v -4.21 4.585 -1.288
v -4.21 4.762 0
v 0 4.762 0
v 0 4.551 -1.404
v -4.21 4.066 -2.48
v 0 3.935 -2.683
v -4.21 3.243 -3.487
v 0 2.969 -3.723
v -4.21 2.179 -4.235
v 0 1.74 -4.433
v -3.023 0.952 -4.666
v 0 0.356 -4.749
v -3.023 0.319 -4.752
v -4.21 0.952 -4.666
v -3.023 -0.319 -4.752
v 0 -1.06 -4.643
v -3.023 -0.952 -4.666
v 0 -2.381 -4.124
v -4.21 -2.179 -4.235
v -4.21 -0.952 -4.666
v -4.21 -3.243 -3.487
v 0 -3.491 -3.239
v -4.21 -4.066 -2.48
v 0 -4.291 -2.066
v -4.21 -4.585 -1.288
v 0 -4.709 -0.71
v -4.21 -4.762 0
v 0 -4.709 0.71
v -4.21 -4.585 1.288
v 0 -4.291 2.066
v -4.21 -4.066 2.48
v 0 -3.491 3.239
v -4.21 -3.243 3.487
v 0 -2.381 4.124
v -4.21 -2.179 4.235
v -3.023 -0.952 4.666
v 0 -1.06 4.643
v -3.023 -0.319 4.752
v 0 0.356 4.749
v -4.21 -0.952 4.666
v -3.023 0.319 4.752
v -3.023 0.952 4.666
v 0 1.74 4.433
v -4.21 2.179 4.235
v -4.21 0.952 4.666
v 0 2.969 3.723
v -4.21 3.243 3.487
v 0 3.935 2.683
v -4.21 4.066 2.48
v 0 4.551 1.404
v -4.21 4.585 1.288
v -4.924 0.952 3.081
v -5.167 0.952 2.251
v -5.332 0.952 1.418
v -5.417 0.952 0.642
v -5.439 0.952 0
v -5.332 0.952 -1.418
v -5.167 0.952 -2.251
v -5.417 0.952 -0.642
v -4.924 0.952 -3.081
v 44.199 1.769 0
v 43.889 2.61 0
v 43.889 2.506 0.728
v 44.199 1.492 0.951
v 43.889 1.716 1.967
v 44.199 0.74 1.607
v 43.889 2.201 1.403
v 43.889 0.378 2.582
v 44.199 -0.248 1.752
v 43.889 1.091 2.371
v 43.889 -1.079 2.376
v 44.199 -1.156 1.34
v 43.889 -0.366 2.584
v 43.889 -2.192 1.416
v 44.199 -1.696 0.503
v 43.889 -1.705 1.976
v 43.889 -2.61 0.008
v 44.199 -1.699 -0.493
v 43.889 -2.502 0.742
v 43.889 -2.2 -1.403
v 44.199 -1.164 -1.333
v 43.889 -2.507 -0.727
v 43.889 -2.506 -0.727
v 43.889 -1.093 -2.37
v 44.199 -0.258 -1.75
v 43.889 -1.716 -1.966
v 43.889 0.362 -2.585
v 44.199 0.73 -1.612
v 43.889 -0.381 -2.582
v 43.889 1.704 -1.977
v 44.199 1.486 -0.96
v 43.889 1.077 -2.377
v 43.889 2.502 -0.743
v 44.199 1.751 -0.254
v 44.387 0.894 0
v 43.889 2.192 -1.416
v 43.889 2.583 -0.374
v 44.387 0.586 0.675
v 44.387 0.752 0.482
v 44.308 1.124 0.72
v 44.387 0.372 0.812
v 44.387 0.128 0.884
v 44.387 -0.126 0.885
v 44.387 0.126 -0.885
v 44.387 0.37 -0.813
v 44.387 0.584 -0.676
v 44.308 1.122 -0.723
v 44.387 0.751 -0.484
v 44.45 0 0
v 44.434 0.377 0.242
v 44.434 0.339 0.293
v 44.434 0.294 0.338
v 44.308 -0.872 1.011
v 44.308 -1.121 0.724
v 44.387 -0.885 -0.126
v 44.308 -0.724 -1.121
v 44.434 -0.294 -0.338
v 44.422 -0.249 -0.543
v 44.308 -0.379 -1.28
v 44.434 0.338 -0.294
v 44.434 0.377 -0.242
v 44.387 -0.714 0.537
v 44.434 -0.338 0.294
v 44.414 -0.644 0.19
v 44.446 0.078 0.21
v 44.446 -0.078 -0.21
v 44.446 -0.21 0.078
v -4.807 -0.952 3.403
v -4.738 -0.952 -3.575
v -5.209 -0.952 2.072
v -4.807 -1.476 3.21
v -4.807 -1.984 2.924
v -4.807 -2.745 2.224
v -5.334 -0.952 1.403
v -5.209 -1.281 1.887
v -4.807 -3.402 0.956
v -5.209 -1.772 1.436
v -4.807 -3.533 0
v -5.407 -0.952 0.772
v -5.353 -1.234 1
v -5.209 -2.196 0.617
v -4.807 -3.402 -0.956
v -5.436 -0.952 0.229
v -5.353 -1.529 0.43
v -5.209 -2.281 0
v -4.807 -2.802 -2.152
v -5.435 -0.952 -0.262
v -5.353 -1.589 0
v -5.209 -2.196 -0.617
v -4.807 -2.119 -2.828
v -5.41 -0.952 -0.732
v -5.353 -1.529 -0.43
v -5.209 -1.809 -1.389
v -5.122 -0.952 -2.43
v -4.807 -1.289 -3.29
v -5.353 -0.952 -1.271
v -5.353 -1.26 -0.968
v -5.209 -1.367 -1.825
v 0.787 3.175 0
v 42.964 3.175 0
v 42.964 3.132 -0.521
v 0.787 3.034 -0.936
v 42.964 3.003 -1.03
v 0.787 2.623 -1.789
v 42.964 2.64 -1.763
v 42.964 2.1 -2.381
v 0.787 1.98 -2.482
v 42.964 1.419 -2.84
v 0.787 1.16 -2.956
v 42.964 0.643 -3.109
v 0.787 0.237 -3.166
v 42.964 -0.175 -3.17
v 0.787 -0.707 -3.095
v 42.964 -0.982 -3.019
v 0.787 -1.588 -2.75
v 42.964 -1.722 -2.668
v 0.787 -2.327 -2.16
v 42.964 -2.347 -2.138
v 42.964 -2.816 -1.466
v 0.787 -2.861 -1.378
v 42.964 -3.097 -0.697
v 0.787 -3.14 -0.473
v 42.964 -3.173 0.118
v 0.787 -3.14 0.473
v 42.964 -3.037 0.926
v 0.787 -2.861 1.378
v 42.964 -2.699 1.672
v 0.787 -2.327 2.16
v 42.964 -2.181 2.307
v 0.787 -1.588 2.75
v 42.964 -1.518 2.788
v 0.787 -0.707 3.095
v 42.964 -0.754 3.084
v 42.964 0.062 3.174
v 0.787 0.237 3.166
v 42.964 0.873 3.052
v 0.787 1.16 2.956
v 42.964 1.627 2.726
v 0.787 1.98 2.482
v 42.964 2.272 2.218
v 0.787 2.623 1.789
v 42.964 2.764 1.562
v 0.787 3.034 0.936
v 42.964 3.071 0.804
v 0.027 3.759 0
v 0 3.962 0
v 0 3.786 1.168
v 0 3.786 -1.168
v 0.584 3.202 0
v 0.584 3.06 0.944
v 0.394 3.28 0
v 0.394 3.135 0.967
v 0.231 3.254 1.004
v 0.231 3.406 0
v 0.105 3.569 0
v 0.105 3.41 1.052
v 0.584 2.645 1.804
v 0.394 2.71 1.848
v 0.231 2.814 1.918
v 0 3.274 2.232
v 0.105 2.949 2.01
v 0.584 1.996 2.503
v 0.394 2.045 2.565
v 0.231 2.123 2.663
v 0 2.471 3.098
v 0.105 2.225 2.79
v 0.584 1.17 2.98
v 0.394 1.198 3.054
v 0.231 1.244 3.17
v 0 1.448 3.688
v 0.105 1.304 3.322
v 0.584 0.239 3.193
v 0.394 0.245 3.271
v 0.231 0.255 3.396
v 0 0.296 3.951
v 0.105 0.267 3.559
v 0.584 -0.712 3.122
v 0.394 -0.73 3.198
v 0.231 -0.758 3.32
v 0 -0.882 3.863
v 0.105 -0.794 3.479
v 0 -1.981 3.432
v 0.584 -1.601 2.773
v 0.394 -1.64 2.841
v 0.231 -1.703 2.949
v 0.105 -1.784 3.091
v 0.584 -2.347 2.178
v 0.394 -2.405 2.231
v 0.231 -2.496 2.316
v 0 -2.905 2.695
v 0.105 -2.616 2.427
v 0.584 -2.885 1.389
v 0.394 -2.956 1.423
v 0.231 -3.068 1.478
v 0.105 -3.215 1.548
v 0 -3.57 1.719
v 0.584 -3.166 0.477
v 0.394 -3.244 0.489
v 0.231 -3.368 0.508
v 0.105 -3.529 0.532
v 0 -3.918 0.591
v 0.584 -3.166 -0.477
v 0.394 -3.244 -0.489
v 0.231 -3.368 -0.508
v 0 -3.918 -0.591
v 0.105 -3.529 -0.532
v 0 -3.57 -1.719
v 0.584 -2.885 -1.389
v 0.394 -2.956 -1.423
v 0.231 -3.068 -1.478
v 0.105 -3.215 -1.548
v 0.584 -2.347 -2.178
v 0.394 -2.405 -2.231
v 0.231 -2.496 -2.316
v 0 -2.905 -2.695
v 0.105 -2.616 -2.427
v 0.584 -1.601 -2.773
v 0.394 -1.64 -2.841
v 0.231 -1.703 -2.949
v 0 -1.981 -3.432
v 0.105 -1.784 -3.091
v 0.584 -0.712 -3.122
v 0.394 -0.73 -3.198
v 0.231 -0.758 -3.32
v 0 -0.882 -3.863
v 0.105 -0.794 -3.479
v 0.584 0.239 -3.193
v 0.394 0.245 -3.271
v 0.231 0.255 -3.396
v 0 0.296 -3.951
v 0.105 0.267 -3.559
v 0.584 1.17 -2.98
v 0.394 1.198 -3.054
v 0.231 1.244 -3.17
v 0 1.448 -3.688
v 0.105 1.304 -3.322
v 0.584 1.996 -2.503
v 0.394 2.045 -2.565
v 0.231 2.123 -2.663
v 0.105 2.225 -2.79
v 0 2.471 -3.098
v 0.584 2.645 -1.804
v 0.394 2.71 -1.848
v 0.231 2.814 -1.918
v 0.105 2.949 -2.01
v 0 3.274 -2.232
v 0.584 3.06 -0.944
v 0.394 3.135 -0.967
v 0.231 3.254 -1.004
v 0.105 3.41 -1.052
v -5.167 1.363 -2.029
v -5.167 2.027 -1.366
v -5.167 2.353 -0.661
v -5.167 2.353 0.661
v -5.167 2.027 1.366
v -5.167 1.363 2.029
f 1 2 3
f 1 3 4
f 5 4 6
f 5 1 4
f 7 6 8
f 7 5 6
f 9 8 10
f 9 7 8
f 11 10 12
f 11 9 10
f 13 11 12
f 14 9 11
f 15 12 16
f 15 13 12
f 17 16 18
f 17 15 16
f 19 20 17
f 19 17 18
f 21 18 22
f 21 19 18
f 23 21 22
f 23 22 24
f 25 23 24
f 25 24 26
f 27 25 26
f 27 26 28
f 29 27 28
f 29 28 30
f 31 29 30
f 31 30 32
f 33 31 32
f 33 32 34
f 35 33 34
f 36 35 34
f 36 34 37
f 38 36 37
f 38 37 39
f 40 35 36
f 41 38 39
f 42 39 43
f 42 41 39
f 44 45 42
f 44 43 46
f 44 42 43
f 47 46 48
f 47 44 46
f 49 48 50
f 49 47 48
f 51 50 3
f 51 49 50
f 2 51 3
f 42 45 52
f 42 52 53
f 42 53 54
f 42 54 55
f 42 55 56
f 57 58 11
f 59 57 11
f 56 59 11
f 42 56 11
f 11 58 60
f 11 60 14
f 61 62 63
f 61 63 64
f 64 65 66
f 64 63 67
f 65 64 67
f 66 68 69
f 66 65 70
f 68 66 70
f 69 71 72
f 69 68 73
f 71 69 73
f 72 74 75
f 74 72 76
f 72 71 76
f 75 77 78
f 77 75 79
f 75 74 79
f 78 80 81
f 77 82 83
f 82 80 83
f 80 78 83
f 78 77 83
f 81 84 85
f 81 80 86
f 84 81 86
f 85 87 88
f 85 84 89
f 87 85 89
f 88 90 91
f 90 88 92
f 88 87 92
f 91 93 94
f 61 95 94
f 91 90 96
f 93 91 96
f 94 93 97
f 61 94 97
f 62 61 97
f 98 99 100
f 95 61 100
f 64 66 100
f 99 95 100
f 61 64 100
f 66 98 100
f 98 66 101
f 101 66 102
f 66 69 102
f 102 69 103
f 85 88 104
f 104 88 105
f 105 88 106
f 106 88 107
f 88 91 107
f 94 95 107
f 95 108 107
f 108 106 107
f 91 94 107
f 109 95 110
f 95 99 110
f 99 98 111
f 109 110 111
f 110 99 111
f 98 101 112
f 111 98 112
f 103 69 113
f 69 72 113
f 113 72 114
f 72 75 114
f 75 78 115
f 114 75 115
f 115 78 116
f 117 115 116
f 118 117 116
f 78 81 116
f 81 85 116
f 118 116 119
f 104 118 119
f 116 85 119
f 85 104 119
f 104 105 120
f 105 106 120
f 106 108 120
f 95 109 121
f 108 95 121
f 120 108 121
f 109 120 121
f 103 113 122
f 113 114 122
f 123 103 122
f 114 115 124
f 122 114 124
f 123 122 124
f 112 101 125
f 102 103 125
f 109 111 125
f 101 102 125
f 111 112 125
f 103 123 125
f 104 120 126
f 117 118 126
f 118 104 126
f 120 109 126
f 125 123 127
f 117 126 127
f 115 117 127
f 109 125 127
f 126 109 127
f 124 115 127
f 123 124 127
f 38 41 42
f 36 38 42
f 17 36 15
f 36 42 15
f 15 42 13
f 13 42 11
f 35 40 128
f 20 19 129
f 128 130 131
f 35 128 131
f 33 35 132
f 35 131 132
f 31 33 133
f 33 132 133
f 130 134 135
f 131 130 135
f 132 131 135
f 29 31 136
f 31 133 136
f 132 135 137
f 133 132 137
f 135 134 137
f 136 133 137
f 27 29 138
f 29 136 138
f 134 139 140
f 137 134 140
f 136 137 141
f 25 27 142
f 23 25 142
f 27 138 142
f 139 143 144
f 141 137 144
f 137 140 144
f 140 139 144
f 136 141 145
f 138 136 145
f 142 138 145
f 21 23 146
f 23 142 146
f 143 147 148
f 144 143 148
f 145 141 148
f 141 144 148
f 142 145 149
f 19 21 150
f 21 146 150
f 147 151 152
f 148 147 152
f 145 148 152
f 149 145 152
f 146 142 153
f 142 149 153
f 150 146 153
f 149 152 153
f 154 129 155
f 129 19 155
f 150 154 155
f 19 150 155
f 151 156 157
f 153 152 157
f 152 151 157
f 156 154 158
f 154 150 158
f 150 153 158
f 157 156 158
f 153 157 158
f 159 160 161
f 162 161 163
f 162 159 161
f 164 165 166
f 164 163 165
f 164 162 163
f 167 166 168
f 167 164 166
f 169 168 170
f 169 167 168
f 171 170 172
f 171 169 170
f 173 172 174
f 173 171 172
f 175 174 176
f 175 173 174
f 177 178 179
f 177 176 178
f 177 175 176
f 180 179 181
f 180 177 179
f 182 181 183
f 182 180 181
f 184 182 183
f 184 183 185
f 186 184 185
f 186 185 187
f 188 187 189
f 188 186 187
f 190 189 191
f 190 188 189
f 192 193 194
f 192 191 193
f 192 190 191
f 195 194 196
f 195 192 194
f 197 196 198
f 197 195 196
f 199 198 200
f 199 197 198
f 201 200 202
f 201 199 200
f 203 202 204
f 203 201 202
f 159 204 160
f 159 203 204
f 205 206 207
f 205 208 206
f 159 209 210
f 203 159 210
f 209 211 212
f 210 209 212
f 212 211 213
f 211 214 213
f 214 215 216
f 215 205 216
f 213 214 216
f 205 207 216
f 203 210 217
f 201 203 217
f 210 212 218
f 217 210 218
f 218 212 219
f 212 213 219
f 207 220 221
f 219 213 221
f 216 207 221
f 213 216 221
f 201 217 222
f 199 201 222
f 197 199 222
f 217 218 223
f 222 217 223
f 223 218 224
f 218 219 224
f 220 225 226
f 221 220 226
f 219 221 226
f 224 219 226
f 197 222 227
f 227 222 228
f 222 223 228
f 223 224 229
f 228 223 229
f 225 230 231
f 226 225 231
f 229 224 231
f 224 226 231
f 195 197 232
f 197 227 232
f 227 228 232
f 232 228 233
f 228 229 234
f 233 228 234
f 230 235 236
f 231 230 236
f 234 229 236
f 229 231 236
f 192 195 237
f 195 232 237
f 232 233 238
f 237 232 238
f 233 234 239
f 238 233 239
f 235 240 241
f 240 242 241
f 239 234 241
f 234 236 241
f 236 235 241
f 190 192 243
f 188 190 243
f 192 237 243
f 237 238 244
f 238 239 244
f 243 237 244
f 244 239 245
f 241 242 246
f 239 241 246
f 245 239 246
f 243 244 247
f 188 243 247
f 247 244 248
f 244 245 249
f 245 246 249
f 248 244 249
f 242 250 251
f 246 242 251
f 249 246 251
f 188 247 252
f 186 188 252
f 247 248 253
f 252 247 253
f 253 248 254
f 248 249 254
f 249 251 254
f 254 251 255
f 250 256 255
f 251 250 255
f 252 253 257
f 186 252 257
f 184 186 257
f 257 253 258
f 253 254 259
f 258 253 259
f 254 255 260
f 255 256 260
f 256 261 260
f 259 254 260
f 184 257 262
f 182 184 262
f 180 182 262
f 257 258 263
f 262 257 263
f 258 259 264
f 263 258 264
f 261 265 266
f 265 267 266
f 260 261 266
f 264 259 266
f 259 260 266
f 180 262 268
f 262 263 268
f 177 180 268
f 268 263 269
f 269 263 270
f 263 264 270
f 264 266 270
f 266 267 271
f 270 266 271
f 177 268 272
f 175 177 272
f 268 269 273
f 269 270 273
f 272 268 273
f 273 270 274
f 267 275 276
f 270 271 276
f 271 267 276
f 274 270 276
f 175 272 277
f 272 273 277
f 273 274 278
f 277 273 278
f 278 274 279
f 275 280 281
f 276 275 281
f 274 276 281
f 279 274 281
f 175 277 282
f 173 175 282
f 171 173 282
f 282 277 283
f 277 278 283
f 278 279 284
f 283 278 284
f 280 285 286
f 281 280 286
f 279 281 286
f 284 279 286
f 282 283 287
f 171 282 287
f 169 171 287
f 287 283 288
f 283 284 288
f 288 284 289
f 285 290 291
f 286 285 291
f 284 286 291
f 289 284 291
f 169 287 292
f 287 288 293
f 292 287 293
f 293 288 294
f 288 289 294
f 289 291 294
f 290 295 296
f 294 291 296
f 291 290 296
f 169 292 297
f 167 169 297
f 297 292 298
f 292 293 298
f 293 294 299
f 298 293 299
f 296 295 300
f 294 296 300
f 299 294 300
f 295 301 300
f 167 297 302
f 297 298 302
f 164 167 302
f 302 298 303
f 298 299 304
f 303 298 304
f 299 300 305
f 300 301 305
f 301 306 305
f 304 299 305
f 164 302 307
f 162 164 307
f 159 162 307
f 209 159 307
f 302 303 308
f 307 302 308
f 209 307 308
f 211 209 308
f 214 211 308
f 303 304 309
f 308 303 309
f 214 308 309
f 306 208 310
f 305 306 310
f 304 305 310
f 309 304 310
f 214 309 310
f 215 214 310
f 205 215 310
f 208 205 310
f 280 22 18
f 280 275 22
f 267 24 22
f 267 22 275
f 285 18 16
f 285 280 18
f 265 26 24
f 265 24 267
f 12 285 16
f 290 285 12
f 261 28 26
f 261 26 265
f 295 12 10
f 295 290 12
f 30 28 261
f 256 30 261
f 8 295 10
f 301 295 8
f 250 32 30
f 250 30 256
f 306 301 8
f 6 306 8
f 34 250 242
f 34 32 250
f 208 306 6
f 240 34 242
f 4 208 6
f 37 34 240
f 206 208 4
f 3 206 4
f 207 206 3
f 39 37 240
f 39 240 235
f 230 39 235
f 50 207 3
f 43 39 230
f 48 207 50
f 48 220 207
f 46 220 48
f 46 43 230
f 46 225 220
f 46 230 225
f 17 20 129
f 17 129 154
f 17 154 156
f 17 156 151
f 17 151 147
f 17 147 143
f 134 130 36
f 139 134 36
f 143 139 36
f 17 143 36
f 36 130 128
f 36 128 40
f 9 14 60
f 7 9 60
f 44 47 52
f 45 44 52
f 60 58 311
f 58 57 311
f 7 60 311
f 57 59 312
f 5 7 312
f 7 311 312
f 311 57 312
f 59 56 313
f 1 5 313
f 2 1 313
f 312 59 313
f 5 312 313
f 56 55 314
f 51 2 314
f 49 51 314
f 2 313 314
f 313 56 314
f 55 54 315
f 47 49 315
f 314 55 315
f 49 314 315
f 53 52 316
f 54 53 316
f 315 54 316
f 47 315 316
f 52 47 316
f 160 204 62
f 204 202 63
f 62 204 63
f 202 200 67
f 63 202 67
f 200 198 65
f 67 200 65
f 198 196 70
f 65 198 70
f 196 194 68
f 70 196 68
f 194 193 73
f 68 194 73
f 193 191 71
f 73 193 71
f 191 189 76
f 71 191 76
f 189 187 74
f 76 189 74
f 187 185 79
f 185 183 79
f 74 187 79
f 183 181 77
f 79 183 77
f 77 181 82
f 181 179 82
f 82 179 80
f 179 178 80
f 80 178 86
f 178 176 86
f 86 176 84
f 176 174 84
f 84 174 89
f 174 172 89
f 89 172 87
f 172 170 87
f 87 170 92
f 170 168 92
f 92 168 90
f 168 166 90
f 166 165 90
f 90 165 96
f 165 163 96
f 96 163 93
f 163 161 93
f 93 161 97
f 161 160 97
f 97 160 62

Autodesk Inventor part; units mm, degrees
ref_plane "YZ Plane" through (0, 0, 0) normal (1, 0, 0) x (0, 1, 0)
sketch "Sketch1" plane through (0, 0, 0) normal (0, 0, 1) x (1, 0, 0)
  line L0 (-5.4864, 0) -> (44.45, 0)
  line L1 (44.45, 0) -> (44.45, 3.175)
  line L2 (44.45, 3.175) -> (25.4, 3.175)
  line L3 (25.4, 3.175) -> (24.638, 3.175)
  line L4 (24.638, 3.175) -> (0, 3.175)
  line L5 (0, 3.175) -> (0, 4.7625)
  line L6 (-15.8499, 0) -> (54.5, 0) projected
  line L7 (0, -0.9693) -> (0, 5.8158) projected
  line L8 (0, 4.7625) -> (-4.2103, 4.7625)
  arc A0 (-4.2103, 4.7625) -> (-5.4864, 0) centre (4.0386, 0) ccw
  line L9 (25.4, 3.175) -> (0, 3.175) construction
  dimension "d0" = 44.45
  dimension "d1" = 19.05
  dimension "d2" = 0.762
  dimension "d3" = 5.4864
  dimension "d4" = 6.35
  dimension "d5" = 6.35
  dimension "d9" = 9.525
  dimension "d10" = 0
  dimension "d13" = 9.525
revolve "Body" add sketch "Sketch1" angle 360 about axis through (-5.4864, 0, 0) along (1, 0, 0)
ref_plane "IDS_WORKPLANE{1}" through (-5.4864, 0, 0) normal (1, 0, 0) x (0, 0, -1)
sketch "Sketch2" plane through (-5.4864, 0, 0) normal (1, 0, 0) x (0, 0, -1)
  circle A0 centre (0, 0) radius 4.7625 projected
  line L0 (0, -6.6675) -> (0, 6.6675) projected
  line L1 (6.6675, 0) -> (-6.6675, 0) projected
  line L2 (-4.7625, 0.9525) -> (4.7625, 0.9525)
  line L3 (4.7625, 0.9525) -> (4.7625, -0.9525)
  line L4 (4.7625, -0.9525) -> (-4.7625, -0.9525)
  line L5 (-4.7625, -0.9525) -> (-4.7625, 0.9525)
  line L6 (-4.7625, 0) -> (4.7625, 0) construction
  line L7 (0, 0.9525) -> (0, -0.9525) construction
  dimension "d15" = 1.905
extrude "Slot" cut sketch "Sketch2" along normal blind 2.4638 contours L1 L0 L2 A0 | L3 L4 A0 | A0 L4 L0 L1 | A0 L2 L3 | L1 A0 L2 L0 | L0 L4 A0 L1 | L5 L2 A0 | A0 L4 L5
thread "Thread" size "1/4-20 UNC" class "2A" standard "ANSI Unified Screw Threads" length 19.05
sketch "Sketch3" plane through (0, 0, 0) normal (0, 0, 1) x (1, 0, 0)
  line L0 (44.45, 0) -> (44.45, 3.175) projected
  line L1 (44.45, 3.175) -> (25.4, 3.175) projected
  line L2 (-5.4864, 0) -> (44.45, 0) projected
  arc A0 (44.45, 0) -> (43.5993, 3.175) centre (38.1, 0) ccw
  line L3 (44.45, -3.175) -> (44.45, 3.175) projected
  line L4 (43.5993, 3.175) -> (43.5993, 0)
  line L5 (43.5993, 0) -> (44.45, 0)
  dimension "d40" = 6.35
revolve "Fillet1" cut sketch "Sketch3" angle 360 about axis through (-5.4864, 0, 0) along (1, 0, 0) contours A0 L1 L0
chamfer "Chamfer" distance 0.635 angle 45 1 edges at (43.5993, -3.175, 0)
ref_plane "Work Plane2" through (41.275, 0, 0) normal (0, 0, -1) x (1, 0, 0)
fillet "Fillet4" radius 0.7874 1 edges at (0, -3.175, 0)
equation "\"d0\" = NLG"
equation "\"d1\" = GEL"
equation "\"d2\" = GAL"
equation "\"d3\" = KOH"
equation "\"d4\" = GD"
equation "\"d5\" = BDM"
equation "\"d9\" = KOD"
equation "\"d13\" = KR"
equation "\"d15\" = SBR"
equation "\"d16\" = STI"
equation "\"d40\" = GD"
equation "\"d46\" = R"
equation "\"d11\" = GEL"
equation "\"d43\" = 0.5 * RR"
equation "\"GD\" = NND"
equation "\"NLG\" = 44.45"
equation "\"GEL\" = 19.05"
equation "\"KOD\" = 9.525"
equation "\"KOH\" = 5.4864"
equation "\"GAL\" = 0.762"
equation "\"BDM\" = NND"
equation "\"SBR\" = 1.905"
equation "\"STI\" = 2.4638"
equation "\"KEWI\" = 0"
equation "\"KR\" = KOD"
equation "\"d14\" = -KOH"
equation "\"R\" = 0.7874"
equation "\"THREADDIA\" = 6.35"
equation "\"TOA\" = 30deg"
equation "\"KOH1\" = 4.3688"
equation "\"NND\" = 6.35"
equation "\"GD1\" = 4.8387"
equation "\"THREADDESC\" = 1.2345"
equation "\"RR\" = 1.27"
properties part number "ANSI B18.6.2 - 1/4-20 UNC - 1.75, SFHCSI" material "Steel, Mild"
